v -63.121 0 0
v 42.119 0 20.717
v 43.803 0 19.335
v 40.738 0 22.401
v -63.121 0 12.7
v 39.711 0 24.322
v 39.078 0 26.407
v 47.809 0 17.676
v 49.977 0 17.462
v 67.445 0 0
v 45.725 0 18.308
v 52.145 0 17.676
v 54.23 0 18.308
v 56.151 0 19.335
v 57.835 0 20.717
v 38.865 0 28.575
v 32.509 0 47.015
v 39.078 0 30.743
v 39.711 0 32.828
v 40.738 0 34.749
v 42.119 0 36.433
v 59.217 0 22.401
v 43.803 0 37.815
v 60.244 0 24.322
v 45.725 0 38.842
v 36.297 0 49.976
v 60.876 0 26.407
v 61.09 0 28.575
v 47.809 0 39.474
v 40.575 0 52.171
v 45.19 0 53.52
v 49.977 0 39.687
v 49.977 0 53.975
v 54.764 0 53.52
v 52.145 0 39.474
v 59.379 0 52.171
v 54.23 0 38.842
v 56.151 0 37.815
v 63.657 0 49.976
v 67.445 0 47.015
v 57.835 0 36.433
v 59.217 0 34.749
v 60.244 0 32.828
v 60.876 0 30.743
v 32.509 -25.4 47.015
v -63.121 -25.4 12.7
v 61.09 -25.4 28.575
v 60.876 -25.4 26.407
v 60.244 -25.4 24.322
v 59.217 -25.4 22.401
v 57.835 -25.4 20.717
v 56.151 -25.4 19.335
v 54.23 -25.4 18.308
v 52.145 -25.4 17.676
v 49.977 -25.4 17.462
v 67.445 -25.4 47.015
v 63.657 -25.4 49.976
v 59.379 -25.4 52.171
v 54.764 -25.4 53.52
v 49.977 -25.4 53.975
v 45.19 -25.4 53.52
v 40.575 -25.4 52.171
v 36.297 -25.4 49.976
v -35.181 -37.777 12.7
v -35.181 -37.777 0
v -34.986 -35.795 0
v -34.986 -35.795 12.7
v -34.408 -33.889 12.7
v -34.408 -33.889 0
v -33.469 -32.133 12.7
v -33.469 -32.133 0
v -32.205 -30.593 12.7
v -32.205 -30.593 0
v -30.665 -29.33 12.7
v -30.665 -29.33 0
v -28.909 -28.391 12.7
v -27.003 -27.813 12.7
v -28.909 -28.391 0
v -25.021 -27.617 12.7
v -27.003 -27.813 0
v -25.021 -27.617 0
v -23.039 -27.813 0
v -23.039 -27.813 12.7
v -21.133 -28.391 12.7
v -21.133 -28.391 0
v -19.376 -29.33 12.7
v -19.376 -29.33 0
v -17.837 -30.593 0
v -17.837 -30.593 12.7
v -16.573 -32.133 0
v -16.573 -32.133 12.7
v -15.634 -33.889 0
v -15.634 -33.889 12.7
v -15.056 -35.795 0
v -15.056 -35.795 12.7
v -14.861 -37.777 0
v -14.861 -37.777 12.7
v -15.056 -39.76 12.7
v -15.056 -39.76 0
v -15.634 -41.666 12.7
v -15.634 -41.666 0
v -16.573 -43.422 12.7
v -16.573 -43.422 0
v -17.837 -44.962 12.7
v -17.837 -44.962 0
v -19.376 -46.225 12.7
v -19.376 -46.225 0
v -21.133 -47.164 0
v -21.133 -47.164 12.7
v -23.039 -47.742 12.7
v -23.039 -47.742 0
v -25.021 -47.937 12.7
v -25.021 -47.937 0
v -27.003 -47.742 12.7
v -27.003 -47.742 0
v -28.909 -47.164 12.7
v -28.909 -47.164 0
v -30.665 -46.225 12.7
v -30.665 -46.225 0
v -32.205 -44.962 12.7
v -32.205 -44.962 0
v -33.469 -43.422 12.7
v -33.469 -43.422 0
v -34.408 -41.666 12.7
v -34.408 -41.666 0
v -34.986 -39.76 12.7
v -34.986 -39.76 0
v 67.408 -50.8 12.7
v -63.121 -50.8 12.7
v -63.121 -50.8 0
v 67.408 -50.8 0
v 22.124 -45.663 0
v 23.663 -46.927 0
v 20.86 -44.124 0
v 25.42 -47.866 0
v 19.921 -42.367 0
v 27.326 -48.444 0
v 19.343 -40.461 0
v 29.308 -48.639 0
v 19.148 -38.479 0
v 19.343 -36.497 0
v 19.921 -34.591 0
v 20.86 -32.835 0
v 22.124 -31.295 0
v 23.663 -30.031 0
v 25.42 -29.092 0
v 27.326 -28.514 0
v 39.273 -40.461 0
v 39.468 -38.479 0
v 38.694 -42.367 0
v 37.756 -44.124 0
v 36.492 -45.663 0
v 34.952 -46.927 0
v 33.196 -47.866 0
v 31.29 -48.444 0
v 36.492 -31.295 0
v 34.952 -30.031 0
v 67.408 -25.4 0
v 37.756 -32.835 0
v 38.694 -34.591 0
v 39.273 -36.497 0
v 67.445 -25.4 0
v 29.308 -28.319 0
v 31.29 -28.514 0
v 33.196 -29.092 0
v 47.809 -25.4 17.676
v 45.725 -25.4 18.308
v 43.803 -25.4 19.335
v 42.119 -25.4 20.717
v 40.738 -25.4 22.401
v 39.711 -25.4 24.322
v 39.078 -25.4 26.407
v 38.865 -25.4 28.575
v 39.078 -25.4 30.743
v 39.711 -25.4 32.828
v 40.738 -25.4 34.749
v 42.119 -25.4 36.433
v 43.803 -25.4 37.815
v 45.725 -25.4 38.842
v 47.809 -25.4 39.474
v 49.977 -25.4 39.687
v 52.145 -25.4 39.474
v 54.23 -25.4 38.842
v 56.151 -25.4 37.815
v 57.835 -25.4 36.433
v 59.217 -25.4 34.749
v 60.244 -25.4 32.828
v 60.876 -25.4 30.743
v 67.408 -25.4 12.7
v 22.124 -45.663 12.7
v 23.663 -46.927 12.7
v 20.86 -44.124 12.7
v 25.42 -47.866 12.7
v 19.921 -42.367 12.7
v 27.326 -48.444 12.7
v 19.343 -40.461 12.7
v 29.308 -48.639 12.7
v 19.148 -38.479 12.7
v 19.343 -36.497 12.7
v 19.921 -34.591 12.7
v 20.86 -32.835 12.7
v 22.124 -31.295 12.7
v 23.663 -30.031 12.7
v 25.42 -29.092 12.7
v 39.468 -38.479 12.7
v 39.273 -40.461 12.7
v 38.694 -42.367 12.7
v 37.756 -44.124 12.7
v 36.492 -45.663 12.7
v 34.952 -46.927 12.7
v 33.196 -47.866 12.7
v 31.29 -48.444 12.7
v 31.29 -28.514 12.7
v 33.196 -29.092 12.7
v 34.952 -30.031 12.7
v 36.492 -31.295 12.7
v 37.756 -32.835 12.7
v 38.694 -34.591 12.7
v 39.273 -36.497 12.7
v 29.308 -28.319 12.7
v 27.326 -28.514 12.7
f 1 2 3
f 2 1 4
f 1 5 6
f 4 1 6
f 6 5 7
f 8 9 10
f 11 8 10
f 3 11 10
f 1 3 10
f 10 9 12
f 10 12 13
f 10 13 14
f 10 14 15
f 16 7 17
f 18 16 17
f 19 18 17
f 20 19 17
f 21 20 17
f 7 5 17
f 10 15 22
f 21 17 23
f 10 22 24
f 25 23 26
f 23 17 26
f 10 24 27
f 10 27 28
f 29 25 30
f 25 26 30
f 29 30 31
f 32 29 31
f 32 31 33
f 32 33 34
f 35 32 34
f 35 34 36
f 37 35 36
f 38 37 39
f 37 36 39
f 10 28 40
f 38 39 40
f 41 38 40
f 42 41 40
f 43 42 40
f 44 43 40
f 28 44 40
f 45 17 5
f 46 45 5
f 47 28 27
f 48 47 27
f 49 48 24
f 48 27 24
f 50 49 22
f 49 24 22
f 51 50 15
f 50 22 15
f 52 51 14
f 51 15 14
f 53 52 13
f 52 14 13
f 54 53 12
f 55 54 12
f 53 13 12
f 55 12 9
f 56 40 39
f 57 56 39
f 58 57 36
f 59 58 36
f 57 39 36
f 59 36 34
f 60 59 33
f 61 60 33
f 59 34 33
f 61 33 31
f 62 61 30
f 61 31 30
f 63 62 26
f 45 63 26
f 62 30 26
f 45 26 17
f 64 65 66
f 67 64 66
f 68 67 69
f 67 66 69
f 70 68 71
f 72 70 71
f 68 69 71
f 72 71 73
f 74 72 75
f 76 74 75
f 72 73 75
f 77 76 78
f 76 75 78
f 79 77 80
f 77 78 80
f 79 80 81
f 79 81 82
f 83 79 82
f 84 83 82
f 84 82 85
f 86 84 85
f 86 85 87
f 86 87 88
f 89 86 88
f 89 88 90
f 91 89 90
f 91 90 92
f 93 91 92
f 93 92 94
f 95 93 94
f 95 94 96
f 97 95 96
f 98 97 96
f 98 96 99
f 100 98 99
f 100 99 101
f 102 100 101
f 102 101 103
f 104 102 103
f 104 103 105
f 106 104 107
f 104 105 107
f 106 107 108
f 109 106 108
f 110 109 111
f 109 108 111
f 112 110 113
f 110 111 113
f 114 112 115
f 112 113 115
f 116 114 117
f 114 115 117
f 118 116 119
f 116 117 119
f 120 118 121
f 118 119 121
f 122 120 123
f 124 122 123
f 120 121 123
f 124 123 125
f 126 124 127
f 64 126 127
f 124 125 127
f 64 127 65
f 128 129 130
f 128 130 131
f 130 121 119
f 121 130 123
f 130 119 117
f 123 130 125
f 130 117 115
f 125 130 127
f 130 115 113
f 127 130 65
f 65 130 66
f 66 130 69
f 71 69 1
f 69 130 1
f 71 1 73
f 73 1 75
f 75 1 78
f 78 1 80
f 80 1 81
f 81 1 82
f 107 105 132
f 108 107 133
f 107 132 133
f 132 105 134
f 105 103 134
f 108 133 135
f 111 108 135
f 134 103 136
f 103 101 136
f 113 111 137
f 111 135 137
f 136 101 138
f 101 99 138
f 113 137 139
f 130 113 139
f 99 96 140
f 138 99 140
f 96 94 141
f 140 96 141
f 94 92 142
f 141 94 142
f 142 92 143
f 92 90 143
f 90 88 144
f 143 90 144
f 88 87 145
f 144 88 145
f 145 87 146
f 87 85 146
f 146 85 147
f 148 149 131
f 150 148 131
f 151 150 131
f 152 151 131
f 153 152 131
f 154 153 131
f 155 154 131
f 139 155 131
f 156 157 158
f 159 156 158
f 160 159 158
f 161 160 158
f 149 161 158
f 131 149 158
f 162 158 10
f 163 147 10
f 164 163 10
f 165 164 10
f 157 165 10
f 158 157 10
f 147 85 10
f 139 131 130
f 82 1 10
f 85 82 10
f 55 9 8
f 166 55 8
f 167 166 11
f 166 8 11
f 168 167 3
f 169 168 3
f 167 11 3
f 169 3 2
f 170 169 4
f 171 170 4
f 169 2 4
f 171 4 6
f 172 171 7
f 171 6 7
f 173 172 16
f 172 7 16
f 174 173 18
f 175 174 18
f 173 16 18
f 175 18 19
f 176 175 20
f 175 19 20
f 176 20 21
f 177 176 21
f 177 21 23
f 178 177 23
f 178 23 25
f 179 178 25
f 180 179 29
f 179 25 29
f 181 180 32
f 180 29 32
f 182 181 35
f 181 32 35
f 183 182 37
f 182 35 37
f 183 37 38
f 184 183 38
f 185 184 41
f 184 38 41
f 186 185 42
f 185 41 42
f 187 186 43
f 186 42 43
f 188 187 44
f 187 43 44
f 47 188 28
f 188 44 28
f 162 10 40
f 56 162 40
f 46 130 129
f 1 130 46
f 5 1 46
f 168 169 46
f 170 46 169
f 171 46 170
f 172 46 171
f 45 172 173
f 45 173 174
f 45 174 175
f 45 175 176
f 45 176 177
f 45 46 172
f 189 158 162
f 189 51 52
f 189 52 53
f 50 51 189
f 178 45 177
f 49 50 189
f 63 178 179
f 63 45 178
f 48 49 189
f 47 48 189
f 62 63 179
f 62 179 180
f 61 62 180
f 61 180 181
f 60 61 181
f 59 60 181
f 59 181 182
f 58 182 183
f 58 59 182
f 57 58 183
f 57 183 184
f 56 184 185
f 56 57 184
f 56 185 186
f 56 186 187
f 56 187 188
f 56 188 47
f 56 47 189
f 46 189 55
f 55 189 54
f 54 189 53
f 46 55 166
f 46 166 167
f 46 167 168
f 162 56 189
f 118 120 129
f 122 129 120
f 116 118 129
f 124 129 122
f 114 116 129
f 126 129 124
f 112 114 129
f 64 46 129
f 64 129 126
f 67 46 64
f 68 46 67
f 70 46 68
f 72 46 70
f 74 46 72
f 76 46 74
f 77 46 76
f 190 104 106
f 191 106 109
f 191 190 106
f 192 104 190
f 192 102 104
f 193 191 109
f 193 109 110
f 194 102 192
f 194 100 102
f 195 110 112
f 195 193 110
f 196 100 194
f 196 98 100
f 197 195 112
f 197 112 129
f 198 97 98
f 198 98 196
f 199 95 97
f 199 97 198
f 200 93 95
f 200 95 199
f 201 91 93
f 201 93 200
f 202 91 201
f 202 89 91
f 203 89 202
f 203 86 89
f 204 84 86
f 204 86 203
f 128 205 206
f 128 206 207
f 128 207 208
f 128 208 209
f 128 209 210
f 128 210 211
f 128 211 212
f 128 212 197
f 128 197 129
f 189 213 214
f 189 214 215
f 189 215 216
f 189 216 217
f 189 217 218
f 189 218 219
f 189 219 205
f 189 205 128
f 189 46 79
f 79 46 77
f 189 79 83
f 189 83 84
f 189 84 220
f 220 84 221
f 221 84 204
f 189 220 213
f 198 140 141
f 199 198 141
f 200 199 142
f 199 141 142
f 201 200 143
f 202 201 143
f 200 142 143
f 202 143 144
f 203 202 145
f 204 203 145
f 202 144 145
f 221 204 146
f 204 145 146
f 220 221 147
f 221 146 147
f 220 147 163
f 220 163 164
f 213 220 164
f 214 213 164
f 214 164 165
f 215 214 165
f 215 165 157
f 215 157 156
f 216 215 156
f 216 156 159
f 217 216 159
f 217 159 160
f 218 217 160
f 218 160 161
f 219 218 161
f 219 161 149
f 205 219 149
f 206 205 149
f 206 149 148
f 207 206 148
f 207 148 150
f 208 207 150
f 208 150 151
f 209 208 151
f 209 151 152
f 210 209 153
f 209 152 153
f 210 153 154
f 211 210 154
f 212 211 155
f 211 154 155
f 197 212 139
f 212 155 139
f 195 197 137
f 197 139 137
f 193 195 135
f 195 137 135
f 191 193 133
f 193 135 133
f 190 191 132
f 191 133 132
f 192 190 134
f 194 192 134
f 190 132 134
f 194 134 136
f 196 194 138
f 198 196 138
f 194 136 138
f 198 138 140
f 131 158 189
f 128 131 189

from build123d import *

# Parameters (mm, degrees)
F1_DEPTH = 25.4
F3_W     = 130.528664
F3_H     = 12.7
F4_DEPTH = 25.4
F6_D     = 20.32


with BuildPart() as f1:
    # F0 (on Front) → F1 (new body)
    with BuildSketch(Plane.XZ):
        with BuildLine():
            Line((-63.120894, 12.7), (-63.120894, 0))
            Line((-63.120894, 0), (49.977216, 0))
            Line((49.977216, 0), (67.445484, 0))
            Line((67.445484, 0), (67.445484, 47.014621))
            ThreePointArc((67.445484, 47.014621), (49.977216, 53.975), (32.508948, 47.014621))
            Line((32.508948, 47.014621), (-63.120894, 12.7))
        make_face()
        with BuildLine():
            ThreePointArc((61.089716, 28.575), (57.83494, 20.717276), (49.977216, 17.4625))
            ThreePointArc((49.977216, 17.4625), (42.119492, 36.432724), (61.089716, 28.575))
        make_face(mode=Mode.SUBTRACT)
    extrude(amount=F1_DEPTH)

    # F3 (on face) → F4 (join)
    with BuildSketch(Plane.XZ.offset(25.4)):
        with Locations((2.143438, 6.35)):
            Rectangle(F3_W, F3_H)
    extrude(amount=F4_DEPTH)

    # F6 (through all)
    with Locations(Plane.XY.offset(12.7)):
        with Locations((-25.020894, -37.777487), (29.30777, -38.479097)):
            Hole(F6_D / 2)


solid = f1.part
